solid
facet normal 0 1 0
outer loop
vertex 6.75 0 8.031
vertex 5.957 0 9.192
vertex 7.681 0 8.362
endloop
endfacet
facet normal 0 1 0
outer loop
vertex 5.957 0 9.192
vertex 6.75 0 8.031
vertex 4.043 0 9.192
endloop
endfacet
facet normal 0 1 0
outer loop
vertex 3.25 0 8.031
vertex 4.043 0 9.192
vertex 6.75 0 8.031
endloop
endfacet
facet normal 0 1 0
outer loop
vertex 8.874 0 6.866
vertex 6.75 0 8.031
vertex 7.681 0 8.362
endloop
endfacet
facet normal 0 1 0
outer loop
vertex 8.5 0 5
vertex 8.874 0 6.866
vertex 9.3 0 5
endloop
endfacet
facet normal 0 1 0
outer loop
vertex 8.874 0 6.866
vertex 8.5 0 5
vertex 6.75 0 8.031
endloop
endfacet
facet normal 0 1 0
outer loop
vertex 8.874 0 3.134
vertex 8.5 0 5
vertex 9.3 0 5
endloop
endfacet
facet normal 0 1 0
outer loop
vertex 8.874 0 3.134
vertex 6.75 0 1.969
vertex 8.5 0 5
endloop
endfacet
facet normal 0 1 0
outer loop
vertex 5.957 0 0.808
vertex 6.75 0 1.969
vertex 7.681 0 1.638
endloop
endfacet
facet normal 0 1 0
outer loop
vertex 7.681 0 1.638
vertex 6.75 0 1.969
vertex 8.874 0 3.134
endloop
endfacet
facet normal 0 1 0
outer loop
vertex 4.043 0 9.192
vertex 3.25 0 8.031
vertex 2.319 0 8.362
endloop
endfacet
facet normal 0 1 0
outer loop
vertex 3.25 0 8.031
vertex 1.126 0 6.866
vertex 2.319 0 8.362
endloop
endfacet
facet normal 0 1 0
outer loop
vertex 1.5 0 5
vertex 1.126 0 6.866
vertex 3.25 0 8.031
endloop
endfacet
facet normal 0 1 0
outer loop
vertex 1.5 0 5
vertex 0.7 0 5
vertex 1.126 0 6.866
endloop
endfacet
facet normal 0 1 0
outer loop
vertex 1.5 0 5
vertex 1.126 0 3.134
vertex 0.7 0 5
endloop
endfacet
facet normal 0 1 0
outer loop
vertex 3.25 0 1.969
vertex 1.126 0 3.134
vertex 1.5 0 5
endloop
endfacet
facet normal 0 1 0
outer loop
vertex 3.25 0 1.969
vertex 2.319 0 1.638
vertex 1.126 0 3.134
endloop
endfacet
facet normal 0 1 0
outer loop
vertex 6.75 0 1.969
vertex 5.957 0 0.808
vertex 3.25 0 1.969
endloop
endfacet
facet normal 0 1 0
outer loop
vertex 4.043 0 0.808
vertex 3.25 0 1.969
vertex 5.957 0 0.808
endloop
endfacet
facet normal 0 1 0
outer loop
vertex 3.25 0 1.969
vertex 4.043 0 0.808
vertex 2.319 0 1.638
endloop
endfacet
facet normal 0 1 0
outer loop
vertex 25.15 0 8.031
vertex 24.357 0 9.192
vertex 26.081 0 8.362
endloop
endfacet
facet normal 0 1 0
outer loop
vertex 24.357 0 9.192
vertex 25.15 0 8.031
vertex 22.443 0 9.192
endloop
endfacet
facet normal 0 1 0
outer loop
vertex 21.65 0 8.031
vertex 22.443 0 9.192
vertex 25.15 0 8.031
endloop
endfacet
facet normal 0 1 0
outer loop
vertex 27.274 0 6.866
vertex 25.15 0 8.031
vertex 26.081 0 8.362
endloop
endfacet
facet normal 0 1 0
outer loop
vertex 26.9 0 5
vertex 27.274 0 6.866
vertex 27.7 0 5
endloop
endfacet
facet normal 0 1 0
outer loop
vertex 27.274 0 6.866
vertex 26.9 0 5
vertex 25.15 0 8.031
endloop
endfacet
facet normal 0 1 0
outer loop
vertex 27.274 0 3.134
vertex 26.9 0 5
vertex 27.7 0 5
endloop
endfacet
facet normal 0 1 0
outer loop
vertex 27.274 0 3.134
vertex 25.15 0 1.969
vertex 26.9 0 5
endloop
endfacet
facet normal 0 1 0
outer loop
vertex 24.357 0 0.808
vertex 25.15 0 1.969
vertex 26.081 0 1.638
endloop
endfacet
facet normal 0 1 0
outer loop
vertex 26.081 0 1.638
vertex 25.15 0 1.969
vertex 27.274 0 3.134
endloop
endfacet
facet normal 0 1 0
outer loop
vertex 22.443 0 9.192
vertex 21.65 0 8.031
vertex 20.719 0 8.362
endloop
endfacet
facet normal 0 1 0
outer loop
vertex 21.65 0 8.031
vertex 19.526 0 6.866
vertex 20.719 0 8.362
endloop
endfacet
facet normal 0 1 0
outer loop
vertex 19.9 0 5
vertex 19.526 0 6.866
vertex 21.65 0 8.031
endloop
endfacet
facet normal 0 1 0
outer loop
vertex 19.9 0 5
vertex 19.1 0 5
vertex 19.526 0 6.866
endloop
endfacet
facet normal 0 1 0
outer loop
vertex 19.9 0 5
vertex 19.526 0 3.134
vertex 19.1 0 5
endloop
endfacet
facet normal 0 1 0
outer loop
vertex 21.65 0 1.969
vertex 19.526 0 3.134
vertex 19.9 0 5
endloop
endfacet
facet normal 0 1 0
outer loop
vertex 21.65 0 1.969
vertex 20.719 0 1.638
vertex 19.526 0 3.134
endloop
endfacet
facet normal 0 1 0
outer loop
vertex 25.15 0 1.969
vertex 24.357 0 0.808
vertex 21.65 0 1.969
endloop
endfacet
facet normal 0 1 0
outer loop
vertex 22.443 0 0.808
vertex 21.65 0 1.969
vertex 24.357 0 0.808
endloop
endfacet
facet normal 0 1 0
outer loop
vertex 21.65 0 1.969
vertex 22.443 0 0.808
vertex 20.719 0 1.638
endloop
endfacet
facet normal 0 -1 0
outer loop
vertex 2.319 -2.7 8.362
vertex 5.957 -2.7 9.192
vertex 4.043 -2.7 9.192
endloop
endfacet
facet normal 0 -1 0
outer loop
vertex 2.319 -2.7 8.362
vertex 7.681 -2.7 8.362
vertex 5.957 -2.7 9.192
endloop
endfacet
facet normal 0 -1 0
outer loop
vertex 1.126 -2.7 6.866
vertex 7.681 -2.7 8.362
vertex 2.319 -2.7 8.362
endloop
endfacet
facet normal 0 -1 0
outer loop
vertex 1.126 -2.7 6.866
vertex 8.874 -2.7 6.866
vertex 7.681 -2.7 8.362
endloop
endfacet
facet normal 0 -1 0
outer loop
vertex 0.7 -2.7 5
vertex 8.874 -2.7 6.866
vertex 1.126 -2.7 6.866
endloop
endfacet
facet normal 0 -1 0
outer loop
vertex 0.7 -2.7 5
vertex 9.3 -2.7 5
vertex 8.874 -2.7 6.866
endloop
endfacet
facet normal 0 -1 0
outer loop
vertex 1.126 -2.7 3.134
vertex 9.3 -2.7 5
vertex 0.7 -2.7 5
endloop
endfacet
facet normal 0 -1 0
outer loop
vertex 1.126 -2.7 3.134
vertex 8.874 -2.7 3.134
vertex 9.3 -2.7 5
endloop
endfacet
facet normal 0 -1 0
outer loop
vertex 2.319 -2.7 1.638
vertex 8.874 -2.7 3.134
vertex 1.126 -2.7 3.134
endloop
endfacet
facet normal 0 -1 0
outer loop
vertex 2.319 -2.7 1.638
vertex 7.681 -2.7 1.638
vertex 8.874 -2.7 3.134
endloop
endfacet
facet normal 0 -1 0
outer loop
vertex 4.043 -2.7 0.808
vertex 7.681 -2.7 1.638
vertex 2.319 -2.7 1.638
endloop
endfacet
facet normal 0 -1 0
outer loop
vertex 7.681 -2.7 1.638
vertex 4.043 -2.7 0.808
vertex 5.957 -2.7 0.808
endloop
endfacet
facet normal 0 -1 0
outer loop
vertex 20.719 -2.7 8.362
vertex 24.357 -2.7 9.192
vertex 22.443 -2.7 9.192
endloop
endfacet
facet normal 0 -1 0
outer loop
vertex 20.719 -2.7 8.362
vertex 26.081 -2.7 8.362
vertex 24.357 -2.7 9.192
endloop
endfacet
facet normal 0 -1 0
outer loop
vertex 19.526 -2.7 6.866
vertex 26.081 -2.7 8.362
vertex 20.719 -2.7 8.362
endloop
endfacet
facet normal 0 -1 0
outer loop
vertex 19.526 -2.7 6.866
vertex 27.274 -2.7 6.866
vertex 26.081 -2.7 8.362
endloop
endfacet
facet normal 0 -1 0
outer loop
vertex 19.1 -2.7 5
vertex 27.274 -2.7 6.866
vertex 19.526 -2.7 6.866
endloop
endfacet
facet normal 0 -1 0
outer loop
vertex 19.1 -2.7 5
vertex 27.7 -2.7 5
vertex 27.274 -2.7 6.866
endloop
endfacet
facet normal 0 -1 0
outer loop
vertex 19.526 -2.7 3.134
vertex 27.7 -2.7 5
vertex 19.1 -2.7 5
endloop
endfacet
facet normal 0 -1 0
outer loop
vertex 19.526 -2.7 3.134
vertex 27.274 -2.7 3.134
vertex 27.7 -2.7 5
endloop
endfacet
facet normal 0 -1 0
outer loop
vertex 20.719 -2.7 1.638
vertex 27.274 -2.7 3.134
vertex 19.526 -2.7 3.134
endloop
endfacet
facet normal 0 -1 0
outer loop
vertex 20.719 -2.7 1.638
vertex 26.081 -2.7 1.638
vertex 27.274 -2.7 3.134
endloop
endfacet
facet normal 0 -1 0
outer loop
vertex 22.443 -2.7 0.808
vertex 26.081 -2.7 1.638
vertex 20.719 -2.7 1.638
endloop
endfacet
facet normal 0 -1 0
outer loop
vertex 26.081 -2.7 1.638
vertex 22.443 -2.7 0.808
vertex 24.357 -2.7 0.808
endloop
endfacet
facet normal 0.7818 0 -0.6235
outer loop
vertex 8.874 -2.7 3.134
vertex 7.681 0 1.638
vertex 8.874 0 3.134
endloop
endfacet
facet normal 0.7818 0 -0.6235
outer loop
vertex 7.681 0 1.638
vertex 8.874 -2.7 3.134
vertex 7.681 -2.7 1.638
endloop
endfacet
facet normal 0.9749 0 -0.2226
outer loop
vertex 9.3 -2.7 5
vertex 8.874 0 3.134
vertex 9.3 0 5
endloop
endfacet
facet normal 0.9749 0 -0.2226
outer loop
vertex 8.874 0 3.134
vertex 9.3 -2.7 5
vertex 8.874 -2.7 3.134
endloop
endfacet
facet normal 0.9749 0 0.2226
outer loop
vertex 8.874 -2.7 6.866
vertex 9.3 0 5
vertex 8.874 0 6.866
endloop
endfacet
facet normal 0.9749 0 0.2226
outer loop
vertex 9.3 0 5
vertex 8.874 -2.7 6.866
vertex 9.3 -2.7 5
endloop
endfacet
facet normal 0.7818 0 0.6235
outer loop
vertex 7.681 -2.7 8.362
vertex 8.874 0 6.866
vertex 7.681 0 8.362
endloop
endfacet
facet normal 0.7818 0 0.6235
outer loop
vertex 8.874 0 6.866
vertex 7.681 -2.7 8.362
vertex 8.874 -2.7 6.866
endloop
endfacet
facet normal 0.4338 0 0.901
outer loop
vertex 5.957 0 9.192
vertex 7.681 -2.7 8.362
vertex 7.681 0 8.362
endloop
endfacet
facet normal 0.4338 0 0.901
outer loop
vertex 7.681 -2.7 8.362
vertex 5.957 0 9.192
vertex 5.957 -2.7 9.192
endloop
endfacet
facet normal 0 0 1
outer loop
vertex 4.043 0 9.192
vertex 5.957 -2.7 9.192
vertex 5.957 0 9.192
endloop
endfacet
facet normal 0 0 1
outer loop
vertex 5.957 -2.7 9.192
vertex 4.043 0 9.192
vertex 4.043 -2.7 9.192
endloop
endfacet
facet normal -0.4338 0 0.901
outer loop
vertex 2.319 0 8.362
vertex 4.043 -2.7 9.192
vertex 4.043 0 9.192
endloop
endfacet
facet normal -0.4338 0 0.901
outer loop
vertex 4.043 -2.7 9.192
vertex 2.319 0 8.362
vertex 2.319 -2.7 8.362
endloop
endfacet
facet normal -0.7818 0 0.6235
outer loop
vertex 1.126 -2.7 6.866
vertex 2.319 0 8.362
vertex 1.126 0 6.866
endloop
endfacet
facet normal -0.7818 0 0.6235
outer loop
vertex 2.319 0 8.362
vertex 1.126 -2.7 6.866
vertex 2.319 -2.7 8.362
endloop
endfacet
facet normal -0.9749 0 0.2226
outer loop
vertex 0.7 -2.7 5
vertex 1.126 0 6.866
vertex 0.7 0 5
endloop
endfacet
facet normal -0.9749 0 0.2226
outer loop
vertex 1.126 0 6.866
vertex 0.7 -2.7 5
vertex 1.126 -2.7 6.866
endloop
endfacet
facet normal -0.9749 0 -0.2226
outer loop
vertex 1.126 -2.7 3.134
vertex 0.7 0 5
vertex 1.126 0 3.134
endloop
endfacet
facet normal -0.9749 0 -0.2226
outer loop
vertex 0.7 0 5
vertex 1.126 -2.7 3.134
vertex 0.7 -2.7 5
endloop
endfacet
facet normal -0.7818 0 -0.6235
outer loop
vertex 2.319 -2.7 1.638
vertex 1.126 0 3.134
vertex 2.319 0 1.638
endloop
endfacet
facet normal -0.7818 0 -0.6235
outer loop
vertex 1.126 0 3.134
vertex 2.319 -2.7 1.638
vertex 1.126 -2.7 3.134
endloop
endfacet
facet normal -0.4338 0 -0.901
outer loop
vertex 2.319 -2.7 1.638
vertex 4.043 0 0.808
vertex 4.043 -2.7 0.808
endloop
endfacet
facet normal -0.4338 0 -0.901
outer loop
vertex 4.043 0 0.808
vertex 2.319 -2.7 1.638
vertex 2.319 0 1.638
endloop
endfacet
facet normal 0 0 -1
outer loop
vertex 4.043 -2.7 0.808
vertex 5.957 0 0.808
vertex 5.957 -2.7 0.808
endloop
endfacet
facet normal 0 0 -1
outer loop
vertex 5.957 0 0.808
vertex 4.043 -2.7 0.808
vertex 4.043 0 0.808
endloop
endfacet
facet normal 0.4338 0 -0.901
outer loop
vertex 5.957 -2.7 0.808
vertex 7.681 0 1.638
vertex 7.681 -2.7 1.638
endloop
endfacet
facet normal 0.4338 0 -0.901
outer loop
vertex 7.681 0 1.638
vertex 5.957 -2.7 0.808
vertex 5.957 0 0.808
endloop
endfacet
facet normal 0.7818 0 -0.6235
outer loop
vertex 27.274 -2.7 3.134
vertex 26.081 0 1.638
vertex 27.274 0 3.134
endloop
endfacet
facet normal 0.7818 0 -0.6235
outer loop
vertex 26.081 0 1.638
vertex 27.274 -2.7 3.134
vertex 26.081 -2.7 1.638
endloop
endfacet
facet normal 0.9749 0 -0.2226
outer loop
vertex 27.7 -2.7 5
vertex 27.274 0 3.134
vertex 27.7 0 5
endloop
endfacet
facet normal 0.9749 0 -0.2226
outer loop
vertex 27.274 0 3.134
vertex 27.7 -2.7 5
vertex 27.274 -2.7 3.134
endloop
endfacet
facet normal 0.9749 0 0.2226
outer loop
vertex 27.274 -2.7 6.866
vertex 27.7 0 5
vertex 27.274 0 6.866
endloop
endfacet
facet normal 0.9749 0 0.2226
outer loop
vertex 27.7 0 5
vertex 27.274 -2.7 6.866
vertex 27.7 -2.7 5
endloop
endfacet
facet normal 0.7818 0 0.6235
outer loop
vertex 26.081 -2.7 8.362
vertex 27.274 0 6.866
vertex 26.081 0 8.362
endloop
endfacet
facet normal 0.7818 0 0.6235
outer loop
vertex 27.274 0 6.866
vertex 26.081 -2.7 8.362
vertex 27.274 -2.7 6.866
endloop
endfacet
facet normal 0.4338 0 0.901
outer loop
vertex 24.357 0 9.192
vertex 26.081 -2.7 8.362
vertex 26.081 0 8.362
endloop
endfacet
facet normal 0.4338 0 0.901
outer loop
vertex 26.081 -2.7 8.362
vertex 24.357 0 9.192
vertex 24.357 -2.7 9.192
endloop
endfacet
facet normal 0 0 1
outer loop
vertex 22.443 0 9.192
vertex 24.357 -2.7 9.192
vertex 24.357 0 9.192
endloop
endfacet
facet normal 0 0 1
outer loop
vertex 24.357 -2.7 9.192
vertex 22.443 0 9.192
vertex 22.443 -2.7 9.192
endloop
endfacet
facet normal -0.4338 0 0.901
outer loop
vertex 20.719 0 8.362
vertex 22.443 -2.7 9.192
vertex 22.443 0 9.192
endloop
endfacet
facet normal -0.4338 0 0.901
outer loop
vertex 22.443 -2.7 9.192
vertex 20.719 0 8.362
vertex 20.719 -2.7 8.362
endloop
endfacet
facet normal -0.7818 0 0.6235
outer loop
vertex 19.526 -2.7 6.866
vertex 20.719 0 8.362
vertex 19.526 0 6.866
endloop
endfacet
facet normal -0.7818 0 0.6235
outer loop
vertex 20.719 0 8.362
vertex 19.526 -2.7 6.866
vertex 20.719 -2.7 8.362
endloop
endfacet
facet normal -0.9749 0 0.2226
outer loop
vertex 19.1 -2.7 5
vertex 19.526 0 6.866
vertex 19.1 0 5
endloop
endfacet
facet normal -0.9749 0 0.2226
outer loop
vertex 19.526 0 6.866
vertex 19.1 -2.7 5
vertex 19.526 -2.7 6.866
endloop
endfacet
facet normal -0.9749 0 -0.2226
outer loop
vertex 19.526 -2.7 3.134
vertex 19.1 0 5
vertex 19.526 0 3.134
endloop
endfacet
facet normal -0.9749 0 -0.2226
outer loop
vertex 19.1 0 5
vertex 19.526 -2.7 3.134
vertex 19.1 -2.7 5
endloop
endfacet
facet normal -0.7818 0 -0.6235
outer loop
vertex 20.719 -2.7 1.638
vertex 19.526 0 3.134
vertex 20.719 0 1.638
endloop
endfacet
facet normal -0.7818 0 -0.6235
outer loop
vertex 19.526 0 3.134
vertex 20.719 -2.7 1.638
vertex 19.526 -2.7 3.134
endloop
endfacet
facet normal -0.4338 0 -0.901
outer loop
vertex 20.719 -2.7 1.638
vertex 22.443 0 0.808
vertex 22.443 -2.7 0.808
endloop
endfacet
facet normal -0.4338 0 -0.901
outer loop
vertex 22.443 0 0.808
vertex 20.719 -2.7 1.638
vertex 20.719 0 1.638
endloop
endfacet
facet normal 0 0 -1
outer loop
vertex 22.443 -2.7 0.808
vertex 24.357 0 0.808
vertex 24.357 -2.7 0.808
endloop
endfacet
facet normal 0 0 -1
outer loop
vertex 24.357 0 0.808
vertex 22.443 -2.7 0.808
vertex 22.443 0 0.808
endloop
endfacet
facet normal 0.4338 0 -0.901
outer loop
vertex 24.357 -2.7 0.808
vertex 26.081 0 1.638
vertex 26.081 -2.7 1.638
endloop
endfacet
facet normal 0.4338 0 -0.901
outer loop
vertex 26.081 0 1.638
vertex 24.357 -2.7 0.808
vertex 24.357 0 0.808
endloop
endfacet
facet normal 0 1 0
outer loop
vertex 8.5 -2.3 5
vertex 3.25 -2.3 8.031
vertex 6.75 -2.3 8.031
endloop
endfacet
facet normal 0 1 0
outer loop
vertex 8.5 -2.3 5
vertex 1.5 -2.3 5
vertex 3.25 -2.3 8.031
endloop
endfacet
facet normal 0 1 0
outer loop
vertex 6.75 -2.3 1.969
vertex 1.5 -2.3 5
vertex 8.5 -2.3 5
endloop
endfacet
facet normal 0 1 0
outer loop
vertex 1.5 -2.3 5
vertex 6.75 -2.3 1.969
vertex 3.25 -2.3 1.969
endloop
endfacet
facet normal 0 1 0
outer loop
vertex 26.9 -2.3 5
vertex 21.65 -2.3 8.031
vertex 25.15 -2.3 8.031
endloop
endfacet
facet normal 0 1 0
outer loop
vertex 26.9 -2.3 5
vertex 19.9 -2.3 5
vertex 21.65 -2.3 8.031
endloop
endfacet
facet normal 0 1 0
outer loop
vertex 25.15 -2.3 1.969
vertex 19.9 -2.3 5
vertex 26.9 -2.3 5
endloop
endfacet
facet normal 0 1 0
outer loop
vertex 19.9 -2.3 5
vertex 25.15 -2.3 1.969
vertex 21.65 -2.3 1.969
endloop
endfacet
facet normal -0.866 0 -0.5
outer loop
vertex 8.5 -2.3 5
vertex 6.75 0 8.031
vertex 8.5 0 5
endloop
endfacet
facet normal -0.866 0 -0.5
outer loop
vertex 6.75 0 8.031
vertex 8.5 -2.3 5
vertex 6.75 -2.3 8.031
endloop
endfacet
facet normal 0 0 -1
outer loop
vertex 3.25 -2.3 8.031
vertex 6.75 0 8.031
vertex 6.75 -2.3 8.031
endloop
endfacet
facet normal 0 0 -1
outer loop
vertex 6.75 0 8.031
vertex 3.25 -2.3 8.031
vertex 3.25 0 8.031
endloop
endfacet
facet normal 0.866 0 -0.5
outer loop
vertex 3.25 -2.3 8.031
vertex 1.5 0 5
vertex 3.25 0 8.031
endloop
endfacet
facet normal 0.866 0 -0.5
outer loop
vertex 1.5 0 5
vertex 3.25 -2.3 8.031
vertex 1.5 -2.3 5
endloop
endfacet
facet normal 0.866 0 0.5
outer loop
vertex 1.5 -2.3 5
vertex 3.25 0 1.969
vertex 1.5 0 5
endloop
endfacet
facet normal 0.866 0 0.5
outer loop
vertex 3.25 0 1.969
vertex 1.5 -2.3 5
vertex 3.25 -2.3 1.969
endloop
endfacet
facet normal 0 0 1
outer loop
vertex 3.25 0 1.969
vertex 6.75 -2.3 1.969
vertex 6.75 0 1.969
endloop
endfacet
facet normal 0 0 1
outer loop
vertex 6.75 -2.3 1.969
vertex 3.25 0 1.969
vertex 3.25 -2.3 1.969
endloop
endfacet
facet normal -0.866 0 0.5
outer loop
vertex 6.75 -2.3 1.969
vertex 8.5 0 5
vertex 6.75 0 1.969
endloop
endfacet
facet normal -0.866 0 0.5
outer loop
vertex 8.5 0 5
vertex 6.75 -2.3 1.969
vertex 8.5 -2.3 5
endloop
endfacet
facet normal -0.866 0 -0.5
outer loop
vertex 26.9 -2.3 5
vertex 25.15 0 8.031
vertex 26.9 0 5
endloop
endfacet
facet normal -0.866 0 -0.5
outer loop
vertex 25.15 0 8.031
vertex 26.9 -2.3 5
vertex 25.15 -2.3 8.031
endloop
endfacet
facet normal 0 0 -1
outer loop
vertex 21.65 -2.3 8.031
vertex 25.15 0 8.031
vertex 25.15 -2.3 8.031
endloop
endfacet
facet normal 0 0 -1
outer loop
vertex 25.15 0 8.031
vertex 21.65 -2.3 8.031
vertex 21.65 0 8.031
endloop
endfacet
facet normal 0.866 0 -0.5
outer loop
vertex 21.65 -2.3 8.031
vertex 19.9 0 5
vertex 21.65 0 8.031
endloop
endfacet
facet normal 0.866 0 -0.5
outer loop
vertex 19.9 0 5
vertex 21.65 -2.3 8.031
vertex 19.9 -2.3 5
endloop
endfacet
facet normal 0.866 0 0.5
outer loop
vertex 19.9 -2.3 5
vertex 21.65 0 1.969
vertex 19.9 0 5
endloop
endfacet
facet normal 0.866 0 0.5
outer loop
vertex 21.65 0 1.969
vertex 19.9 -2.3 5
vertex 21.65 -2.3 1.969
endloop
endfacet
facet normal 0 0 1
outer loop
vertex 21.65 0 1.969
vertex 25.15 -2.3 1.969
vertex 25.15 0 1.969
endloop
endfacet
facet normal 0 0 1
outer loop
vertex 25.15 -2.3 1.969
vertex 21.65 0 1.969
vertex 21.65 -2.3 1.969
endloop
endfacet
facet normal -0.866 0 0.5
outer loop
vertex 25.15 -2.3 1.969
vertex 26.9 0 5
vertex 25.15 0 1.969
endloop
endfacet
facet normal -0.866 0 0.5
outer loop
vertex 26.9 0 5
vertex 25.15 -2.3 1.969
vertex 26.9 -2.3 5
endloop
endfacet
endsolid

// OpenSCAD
// Copyright (C) 2025 Arif K. Rafiq
// This program is free software: you can redistribute it and/or modify
// it under the terms of the GNU General Public License as published by
// the Free Software Foundation, either version 3 of the License, or
// (at your option) any later version.

// This program is distributed in the hope that it will be useful,
// but WITHOUT ANY WARRANTY; without even the implied warranty of
// MERCHANTABILITY or FITNESS FOR A PARTICULAR PURPOSE.  See the
// GNU General Public License for more details.

// You should have received a copy of the GNU General Public License
// along with this file.  If not, see <https://www.gnu.org/licenses/>,
// or write to: license@temperedoptimism.com


// NOTHING SHOWS
// Fixed in example3.scad

tWallMin = 0.40;         // Limit for 3D printer, I have 0.2
pHexSink = [3.5, 2.3];
vTerminal0 = [5.0, 5.0];
vTerminal1 = [23.4, 5.0];
fx0=2;    //convexity
tEps=0.01; // Fixing conflicting bodies

//25:00
// Rotate
rotate([90,0,0]){
difference(){
  // hex pocket surround
  // Read about render(convexity)                           
  linear_extrude(pHexSink.y+ tWallMin, convexity=fx0){  
    translate(vTerminal0)  circle(pHexSink.x +(tWallMin *2));
    translate(vTerminal1)  circle(pHexSink.x +(tWallMin *2));
  }
  //hex pocket
  // Solve Conflicting bodies
  translate([0,0, -tEps]) linear_extrude(pHexSink.y+tEps, convexity=fx0){
      translate(vTerminal0)  circle(pHexSink.x, $fn=6);
      translate(vTerminal1)  circle(pHexSink.x, $fn=6);
  }
 }
}
